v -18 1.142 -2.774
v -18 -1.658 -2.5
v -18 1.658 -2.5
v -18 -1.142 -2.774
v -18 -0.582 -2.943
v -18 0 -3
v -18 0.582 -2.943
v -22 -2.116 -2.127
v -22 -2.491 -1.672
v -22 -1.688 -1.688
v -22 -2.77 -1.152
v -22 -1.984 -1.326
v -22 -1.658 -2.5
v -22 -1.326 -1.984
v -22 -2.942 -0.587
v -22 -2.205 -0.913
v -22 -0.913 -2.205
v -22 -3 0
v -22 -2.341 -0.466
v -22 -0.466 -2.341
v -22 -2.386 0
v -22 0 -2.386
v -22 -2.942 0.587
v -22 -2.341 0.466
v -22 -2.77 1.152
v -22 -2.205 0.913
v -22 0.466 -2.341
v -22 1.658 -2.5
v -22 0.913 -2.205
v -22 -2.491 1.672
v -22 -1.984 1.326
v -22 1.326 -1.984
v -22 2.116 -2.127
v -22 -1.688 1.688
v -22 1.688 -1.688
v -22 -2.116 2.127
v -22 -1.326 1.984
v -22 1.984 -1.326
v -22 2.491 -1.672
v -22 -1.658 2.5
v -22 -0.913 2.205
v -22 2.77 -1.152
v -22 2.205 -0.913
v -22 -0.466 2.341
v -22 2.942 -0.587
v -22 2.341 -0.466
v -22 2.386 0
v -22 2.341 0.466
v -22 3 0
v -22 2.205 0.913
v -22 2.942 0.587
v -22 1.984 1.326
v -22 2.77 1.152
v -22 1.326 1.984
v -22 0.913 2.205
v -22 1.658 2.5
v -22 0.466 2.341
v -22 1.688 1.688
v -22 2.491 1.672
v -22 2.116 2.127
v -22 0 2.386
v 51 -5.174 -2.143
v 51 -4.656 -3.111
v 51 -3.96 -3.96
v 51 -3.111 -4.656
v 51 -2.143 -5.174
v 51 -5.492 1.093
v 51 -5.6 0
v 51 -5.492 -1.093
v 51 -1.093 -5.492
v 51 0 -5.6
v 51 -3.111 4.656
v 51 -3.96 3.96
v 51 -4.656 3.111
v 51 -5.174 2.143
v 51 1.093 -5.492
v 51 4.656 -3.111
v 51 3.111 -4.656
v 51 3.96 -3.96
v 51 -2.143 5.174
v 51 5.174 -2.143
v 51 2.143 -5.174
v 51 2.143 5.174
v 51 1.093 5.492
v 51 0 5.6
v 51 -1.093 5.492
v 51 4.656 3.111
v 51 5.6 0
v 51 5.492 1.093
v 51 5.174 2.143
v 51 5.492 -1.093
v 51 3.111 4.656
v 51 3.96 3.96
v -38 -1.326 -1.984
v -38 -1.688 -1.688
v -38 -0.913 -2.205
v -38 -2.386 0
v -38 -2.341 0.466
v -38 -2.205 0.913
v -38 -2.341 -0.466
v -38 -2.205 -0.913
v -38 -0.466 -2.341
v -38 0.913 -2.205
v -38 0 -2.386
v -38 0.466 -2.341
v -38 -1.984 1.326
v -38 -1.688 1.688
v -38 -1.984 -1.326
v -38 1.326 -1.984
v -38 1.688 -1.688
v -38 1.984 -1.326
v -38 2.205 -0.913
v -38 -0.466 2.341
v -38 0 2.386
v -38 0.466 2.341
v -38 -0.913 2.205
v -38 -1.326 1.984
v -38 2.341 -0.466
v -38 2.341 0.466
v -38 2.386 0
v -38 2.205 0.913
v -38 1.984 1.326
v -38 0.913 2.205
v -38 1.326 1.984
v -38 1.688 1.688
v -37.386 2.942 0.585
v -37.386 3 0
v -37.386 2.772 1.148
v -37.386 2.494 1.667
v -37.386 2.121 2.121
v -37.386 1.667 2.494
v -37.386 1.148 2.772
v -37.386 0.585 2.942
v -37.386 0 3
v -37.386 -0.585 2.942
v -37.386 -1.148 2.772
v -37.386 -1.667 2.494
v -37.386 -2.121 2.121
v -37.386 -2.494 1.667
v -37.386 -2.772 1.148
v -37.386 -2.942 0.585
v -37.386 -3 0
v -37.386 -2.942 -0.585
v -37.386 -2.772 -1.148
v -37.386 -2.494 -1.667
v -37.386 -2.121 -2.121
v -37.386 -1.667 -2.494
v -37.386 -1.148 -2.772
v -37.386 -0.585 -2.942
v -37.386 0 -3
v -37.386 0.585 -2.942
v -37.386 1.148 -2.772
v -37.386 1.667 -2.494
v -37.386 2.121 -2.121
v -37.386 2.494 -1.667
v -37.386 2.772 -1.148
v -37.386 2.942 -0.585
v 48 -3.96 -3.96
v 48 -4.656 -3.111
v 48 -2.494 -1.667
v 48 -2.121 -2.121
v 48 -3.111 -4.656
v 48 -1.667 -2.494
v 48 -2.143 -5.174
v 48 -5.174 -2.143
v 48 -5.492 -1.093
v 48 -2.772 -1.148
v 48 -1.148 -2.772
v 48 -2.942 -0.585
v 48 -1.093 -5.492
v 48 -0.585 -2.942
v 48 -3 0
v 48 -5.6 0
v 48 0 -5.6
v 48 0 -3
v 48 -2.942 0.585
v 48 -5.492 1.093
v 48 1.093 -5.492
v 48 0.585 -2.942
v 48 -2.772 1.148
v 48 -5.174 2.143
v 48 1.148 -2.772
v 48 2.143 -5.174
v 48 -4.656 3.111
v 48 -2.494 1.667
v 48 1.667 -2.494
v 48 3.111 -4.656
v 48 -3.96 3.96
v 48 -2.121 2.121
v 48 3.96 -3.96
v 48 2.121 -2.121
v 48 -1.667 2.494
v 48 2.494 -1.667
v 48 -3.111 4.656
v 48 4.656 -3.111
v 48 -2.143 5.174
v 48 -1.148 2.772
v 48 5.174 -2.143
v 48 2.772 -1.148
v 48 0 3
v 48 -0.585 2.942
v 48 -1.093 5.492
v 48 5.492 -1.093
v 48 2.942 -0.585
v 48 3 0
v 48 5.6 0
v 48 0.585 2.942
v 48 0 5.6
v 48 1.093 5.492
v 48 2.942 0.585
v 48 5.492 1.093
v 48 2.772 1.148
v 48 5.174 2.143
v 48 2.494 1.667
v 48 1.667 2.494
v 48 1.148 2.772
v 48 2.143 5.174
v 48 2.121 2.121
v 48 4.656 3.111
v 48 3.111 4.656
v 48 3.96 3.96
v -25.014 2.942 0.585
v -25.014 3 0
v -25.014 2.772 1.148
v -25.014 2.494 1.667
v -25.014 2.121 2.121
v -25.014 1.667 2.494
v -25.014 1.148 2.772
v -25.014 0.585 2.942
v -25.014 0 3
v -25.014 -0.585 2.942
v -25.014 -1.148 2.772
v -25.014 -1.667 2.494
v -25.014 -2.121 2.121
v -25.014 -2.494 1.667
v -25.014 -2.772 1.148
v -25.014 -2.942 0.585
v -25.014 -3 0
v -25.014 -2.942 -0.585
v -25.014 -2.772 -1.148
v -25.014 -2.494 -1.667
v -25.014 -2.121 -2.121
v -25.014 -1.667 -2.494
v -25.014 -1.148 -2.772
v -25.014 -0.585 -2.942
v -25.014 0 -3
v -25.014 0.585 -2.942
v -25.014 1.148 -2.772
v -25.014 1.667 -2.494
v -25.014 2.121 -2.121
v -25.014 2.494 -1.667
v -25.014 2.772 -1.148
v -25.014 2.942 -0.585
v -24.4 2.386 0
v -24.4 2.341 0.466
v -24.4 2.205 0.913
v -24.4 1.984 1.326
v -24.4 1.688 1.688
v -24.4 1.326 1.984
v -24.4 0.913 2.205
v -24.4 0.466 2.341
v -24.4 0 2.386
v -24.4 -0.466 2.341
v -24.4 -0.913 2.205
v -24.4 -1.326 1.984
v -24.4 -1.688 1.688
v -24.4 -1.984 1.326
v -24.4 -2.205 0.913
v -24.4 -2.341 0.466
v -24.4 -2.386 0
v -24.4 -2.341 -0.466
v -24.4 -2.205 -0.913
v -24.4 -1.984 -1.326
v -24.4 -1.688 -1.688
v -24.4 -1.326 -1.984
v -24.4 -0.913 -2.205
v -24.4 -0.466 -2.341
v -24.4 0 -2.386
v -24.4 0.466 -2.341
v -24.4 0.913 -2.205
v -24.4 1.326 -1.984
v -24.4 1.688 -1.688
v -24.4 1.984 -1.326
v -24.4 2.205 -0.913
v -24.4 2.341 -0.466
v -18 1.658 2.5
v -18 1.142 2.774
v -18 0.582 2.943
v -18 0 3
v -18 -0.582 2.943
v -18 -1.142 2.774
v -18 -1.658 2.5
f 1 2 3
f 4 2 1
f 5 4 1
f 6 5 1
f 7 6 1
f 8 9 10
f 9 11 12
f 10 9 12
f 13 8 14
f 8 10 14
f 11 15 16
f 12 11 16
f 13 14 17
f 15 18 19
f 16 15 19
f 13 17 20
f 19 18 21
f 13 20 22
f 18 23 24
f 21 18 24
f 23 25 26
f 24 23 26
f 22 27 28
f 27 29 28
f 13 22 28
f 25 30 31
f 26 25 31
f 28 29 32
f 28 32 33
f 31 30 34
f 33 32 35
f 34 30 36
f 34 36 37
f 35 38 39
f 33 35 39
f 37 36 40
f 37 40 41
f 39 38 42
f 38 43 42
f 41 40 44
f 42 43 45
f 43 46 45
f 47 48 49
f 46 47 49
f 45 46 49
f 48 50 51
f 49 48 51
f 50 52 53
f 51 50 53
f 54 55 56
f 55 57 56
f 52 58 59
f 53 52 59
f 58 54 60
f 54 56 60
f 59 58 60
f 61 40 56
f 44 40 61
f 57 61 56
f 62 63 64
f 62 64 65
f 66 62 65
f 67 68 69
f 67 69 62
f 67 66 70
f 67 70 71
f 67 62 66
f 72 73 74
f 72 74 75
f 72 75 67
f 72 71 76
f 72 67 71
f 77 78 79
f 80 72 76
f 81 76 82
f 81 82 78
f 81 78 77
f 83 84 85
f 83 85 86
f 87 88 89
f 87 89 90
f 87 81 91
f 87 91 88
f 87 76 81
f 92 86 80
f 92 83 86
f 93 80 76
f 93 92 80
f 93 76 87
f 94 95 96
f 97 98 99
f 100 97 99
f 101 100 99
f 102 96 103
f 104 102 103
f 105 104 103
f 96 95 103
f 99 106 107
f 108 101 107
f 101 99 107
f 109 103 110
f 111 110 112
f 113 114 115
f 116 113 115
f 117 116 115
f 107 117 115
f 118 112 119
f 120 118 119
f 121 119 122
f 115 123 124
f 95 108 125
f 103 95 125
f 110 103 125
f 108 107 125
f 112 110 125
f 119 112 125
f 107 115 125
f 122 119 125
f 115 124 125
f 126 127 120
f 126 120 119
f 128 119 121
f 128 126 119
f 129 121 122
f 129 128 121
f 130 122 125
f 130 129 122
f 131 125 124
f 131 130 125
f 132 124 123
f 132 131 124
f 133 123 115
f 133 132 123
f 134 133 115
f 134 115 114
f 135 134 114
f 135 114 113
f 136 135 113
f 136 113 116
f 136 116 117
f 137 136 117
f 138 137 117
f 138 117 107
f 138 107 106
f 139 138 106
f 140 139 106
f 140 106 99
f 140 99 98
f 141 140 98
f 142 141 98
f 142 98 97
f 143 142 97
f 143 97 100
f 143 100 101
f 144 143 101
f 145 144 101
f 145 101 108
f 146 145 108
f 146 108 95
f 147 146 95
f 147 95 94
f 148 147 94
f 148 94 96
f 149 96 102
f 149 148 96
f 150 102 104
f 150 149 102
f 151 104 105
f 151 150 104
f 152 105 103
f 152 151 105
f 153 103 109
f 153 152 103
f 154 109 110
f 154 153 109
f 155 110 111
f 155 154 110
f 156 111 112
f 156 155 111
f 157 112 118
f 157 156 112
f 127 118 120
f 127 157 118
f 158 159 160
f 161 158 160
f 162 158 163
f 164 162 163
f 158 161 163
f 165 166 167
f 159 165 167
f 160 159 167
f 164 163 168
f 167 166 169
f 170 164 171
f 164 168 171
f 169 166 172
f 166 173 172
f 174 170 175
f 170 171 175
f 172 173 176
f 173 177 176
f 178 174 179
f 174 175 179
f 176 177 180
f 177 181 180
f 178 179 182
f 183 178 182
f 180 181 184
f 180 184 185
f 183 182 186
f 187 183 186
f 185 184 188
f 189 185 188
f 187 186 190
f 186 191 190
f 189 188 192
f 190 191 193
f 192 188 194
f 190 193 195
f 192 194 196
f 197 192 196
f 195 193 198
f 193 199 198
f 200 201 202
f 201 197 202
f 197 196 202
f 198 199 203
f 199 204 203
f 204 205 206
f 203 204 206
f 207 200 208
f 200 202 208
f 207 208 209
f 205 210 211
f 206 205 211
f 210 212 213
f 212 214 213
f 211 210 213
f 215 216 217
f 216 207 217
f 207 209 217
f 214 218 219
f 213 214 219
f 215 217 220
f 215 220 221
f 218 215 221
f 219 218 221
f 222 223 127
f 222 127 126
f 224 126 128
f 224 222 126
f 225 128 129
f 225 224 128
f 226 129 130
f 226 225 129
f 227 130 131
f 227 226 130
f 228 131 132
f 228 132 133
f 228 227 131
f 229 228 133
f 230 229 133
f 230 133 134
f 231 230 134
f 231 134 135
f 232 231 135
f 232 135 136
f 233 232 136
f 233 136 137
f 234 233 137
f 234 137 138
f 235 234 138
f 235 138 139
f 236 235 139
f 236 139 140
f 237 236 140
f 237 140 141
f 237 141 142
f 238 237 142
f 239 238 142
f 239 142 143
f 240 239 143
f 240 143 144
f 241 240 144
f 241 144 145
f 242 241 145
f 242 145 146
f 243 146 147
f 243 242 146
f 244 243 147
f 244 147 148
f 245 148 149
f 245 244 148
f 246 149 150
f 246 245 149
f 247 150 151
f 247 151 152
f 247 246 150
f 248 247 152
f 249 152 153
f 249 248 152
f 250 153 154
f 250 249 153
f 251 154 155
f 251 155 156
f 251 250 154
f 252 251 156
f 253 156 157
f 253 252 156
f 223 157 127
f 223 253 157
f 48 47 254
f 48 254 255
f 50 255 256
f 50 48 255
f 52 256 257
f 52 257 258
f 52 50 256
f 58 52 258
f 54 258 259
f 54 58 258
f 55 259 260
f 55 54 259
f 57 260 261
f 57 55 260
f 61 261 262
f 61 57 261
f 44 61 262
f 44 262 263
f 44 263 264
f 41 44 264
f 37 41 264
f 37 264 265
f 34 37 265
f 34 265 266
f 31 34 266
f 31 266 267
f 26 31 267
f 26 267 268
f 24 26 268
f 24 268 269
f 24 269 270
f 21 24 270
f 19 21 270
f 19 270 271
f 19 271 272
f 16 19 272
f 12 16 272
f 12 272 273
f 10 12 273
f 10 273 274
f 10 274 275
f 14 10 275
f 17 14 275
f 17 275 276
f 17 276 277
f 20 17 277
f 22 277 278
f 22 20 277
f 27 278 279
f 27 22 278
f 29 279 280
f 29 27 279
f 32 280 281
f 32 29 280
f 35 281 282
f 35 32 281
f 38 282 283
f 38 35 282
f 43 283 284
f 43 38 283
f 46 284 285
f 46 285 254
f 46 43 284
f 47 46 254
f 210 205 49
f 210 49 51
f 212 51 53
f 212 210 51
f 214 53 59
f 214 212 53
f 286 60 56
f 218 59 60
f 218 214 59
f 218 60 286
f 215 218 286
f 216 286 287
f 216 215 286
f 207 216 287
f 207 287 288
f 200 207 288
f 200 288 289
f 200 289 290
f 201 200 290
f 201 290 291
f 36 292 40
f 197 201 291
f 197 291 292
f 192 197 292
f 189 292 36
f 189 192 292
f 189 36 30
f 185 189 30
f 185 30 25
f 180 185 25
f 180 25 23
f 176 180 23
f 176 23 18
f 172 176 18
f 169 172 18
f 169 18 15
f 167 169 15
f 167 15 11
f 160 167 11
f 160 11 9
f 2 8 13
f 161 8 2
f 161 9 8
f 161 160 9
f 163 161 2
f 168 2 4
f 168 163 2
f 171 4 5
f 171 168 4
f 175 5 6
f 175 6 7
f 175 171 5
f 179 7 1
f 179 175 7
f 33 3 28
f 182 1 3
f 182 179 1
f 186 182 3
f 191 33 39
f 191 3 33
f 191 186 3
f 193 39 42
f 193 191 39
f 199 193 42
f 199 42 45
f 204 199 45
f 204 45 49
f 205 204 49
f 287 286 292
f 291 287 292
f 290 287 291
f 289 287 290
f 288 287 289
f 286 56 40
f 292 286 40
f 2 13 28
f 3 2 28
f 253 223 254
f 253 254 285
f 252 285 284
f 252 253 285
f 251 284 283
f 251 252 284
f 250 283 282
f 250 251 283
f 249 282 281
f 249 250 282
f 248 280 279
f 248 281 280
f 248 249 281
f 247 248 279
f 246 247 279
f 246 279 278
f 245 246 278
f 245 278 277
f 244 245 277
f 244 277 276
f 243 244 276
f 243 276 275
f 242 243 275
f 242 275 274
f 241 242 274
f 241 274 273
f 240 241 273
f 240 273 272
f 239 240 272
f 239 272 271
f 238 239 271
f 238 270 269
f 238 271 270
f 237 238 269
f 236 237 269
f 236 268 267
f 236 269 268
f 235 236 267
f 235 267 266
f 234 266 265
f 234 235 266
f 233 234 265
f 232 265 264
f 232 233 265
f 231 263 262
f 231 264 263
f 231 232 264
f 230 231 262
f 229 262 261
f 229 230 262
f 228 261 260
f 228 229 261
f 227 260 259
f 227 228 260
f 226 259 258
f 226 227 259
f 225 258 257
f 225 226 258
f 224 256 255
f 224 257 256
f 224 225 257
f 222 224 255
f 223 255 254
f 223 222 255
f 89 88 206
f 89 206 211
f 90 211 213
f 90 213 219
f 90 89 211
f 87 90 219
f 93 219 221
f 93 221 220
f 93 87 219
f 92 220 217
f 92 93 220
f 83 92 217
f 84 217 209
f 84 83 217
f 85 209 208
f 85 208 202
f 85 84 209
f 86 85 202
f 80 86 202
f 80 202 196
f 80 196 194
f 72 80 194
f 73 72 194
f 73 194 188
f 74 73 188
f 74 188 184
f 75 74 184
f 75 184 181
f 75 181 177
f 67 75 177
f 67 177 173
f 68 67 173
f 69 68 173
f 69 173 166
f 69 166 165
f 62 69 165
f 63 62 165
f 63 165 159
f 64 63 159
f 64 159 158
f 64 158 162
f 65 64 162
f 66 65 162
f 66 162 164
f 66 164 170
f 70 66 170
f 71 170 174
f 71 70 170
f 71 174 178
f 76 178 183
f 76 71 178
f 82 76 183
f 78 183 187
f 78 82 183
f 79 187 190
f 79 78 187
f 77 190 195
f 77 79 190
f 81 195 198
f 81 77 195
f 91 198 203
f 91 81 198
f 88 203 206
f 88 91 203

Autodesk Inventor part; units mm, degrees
sketch "Skizze_1" plane through (0, 0, 0) normal (0, 0, 1) x (1, 0, 0)
  line L0 (51, 0) -> (-38, 0)
  line L1 (-38, 0) -> (-38, 2.3865)
  line L2 (-38, 2.3865) -> (-37.3865, 3)
  line L3 (-37.3865, 3) -> (-25.0135, 3)
  line L4 (-25.0135, 3) -> (-24.4, 2.3865)
  line L5 (-24.4, 2.3865) -> (-22, 2.3865)
  line L6 (-22, 2.3865) -> (-22, 3)
  line L7 (-22, 3) -> (48, 3)
  line L8 (48, 3) -> (48, 5.6)
  line L9 (48, 5.6) -> (51, 5.6)
  line L10 (51, 5.6) -> (51, 0)
  line L11 (51, 0) -> (-38, 0)
revolve "Revolution1" add sketch "Skizze_1" angle 360 about axis through (51, 0, 0) along (1, 0, 0)
thread "Thread1" size "M6x1" class "6g" standard "ISO Metric profile" full length
sketch "Skizze_4" plane through (-22, 0, 0) normal (1, 0, 0) x (0, 0, -1)
  line L0 (-5, -16) -> (5, -16)
  line L1 (5, -16) -> (5, 16)
  line L2 (5, 16) -> (-5, 16)
  line L3 (-5, 16) -> (-5, -16)
  line L4 (-2.5, -8) -> (2.5, -8)
  line L5 (2.5, -8) -> (2.5, 8)
  line L6 (2.5, 8) -> (-2.5, 8)
  line L7 (-2.5, 8) -> (-2.5, -8)
extrude "Extrusion1" cut sketch "Skizze_4" along normal blind 4
ref_plane "P1_XY" through (0, 0, 0) normal (1, 0, 0) x (0, 0, -1)
ref_plane "P1_YZ" through (0, 0, 0) normal (0, 0, -1) x (0, 1, 0)
ref_plane "P1_ZX" through (0, 0, 0) normal (0, 1, 0) x (1, 0, 0)
ref_plane "PD1_XY" through (-32, 0, 0) normal (1, 0, 0) x (0, 0, -1)
ref_plane "PD1_YZ" through (-32, 0, 0) normal (0, 0, -1) x (0, 1, 0)
ref_plane "PD1_ZX" through (-32, 0, 0) normal (0, 1, 0) x (1, 0, 0)
ref_plane "PD2_XY" through (102, 0, 0) normal (1, 0, 0) x (0, 0, -1)
ref_plane "PD2_YZ" through (102, 0, 0) normal (0, 0, -1) x (0, 1, 0)
ref_plane "PD2_ZX" through (102, 0, 0) normal (0, 1, 0) x (1, 0, 0)
properties part number "16N2A12A010-(N0-pistone)"
